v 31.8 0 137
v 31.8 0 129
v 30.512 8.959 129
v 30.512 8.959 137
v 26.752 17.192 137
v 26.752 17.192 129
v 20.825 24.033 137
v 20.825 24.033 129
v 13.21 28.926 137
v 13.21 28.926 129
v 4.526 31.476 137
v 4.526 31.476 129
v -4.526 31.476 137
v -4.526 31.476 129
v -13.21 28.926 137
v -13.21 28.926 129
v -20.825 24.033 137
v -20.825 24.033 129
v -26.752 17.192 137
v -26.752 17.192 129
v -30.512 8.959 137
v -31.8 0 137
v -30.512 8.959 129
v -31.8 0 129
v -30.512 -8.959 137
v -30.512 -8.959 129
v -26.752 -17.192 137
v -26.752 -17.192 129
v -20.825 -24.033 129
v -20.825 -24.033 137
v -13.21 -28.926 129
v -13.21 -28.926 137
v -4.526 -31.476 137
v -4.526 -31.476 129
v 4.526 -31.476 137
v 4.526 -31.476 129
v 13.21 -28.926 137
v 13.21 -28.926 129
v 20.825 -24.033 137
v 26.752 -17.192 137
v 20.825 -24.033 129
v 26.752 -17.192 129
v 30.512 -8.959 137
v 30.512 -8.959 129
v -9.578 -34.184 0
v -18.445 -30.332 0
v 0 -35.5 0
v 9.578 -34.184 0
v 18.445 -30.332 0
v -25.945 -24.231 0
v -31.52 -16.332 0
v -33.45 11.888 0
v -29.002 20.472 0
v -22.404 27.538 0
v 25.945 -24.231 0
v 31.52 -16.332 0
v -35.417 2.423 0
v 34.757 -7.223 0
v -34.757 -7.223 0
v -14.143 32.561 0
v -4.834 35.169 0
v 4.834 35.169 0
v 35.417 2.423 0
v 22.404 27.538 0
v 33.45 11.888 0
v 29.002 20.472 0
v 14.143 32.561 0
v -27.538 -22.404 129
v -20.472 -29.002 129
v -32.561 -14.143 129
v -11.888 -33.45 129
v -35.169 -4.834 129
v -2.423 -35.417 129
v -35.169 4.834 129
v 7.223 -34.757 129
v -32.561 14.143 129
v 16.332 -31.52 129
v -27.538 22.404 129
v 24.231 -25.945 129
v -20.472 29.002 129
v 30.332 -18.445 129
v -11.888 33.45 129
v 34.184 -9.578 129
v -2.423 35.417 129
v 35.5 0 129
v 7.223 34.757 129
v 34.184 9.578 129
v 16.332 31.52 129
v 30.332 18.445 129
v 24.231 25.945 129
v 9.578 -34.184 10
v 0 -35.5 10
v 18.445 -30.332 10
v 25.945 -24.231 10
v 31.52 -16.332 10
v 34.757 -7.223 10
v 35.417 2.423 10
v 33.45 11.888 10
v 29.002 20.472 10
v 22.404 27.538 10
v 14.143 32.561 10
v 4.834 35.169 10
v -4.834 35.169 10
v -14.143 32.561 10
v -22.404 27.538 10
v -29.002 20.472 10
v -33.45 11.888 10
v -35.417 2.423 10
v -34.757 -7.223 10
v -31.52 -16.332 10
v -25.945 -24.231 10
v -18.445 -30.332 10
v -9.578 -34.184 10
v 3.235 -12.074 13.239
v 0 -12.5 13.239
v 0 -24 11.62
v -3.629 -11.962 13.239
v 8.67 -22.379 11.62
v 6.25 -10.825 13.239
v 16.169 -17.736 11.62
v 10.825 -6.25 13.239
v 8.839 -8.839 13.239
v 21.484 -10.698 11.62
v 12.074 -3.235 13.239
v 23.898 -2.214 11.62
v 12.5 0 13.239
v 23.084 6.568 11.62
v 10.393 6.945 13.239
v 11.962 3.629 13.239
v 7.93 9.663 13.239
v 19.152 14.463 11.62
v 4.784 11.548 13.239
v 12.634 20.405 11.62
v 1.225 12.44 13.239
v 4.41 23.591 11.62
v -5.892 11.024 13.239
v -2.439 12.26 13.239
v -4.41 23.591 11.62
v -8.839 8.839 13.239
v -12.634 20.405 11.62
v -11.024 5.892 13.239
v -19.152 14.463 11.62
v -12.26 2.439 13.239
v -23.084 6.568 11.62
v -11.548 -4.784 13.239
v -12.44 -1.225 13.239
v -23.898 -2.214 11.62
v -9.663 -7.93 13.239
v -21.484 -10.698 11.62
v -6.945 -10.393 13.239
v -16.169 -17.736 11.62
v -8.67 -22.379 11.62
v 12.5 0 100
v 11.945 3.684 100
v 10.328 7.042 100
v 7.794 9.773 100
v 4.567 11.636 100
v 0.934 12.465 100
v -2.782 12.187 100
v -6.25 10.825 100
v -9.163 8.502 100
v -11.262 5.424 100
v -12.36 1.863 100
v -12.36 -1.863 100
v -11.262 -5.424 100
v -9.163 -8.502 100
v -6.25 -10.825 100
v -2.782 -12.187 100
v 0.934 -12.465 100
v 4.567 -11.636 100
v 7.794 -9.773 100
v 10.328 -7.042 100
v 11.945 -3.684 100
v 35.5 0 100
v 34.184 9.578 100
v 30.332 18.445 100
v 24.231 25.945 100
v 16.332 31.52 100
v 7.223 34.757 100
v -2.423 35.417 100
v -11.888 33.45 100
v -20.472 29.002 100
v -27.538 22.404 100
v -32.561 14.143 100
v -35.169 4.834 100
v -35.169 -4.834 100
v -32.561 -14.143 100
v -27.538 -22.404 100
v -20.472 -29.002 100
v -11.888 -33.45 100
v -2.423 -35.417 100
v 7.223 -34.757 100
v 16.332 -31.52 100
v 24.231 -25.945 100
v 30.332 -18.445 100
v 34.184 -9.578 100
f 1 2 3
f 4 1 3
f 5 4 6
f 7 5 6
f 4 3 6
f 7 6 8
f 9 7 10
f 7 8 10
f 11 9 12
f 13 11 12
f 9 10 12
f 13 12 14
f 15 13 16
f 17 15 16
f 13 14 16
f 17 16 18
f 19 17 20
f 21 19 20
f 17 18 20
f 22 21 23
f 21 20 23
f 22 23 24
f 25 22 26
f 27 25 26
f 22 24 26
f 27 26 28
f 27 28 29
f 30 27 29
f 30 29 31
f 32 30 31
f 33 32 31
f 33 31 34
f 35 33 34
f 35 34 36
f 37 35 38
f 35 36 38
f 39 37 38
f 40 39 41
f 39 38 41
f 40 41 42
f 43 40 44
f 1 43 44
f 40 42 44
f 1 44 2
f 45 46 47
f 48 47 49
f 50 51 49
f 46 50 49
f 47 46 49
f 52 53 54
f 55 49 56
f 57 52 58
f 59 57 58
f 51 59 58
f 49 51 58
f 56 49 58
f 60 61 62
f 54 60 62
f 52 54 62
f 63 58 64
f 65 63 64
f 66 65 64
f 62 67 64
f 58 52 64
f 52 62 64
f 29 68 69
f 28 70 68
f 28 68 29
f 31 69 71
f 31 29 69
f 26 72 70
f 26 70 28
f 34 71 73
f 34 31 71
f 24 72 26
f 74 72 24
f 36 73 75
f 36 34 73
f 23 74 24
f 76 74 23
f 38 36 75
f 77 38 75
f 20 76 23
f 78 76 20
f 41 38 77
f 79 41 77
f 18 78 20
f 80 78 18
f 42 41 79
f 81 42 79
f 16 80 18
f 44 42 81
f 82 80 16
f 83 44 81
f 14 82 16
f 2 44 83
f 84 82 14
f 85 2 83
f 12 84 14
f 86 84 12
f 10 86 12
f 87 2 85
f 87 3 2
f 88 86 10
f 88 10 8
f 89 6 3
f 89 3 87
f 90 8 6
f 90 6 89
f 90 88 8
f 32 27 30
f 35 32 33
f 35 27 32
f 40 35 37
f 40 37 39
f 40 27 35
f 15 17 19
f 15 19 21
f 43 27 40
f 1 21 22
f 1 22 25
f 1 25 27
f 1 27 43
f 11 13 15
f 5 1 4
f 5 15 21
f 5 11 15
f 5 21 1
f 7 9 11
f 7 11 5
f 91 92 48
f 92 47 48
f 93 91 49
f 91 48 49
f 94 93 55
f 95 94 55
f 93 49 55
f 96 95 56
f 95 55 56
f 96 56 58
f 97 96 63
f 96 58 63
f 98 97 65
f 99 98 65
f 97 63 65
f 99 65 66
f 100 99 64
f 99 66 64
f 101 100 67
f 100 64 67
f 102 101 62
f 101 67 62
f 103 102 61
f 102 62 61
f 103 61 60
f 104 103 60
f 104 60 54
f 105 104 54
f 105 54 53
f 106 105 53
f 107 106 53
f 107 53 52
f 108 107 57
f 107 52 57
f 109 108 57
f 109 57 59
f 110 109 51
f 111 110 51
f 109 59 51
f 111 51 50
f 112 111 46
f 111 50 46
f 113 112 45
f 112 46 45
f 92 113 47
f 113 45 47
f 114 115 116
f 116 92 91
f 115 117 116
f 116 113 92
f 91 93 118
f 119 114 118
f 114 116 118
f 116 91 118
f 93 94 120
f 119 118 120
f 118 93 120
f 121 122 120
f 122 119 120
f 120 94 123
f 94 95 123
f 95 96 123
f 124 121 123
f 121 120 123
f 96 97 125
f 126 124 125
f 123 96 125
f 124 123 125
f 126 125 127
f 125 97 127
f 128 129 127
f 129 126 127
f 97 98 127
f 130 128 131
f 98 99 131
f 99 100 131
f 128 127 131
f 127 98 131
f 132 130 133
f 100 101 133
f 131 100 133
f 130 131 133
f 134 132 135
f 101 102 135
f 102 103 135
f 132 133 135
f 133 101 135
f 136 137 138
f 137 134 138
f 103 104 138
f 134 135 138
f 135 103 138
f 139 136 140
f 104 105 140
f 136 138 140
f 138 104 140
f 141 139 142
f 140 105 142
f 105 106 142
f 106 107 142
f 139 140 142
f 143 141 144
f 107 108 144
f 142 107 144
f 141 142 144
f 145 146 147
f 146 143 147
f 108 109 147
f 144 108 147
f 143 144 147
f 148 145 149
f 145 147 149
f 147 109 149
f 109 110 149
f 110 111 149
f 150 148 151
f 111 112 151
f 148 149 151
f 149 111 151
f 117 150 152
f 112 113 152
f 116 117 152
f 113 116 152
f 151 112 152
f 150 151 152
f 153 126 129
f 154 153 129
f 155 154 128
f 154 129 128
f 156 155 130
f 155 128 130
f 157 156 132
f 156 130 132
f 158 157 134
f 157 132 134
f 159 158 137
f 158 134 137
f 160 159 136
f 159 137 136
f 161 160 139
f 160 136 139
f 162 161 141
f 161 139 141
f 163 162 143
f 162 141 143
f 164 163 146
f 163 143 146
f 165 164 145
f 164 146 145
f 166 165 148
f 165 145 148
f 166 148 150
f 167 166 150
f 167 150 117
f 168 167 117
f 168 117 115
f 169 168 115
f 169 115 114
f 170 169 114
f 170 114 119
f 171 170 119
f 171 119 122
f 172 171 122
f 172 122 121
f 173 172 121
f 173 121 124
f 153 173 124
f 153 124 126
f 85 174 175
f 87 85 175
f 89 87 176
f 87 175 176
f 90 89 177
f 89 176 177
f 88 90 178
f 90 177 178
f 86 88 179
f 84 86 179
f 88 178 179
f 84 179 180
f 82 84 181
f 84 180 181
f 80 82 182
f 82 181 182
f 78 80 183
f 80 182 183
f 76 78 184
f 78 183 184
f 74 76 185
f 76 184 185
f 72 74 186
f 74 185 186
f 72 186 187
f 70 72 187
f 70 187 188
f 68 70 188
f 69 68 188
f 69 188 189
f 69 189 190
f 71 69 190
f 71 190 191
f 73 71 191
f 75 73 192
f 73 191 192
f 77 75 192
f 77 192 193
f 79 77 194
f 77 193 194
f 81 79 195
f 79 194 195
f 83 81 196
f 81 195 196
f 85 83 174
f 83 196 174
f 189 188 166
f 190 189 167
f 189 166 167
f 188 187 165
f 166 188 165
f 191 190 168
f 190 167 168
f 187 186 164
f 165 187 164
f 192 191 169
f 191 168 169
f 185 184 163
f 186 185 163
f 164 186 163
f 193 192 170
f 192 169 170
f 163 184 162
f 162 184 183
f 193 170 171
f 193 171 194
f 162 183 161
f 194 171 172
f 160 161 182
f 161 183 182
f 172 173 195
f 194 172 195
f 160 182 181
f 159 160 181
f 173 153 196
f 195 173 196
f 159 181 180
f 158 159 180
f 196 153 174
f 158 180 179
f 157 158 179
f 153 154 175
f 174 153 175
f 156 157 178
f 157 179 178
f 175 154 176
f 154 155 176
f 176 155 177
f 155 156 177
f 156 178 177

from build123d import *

# Parameters (mm, degrees)
F2_R     = 12.5
F3_DEPTH = 100
F4_R     = 35.5
F5_DEPTH = 29
F6_R     = 31.8
F7_DEPTH = 8


with BuildPart() as f1:
    # F0 (on Right) → F1 (revolve)
    with BuildSketch(Plane.YZ):
        Polygon((0, 0), (0, 15), (-35.5, 10), (-35.5, 0), align=None)
    revolve(axis=Axis((0, 0, 2.476192), (0, 0, 1)))

    # F2 (on Top) → F3 (join)
    with BuildSketch(Plane.XY):
        Circle(F2_R)
    extrude(amount=F3_DEPTH)

    # F4 (on face) → F5 (join)
    with BuildSketch(Plane.XY.offset(100)):
        Circle(F4_R)
    extrude(amount=F5_DEPTH)

    # F6 (on face) → F7 (join)
    with BuildSketch(Plane.XY.offset(129)):
        Circle(F6_R)
    extrude(amount=F7_DEPTH)


solid = f1.part
